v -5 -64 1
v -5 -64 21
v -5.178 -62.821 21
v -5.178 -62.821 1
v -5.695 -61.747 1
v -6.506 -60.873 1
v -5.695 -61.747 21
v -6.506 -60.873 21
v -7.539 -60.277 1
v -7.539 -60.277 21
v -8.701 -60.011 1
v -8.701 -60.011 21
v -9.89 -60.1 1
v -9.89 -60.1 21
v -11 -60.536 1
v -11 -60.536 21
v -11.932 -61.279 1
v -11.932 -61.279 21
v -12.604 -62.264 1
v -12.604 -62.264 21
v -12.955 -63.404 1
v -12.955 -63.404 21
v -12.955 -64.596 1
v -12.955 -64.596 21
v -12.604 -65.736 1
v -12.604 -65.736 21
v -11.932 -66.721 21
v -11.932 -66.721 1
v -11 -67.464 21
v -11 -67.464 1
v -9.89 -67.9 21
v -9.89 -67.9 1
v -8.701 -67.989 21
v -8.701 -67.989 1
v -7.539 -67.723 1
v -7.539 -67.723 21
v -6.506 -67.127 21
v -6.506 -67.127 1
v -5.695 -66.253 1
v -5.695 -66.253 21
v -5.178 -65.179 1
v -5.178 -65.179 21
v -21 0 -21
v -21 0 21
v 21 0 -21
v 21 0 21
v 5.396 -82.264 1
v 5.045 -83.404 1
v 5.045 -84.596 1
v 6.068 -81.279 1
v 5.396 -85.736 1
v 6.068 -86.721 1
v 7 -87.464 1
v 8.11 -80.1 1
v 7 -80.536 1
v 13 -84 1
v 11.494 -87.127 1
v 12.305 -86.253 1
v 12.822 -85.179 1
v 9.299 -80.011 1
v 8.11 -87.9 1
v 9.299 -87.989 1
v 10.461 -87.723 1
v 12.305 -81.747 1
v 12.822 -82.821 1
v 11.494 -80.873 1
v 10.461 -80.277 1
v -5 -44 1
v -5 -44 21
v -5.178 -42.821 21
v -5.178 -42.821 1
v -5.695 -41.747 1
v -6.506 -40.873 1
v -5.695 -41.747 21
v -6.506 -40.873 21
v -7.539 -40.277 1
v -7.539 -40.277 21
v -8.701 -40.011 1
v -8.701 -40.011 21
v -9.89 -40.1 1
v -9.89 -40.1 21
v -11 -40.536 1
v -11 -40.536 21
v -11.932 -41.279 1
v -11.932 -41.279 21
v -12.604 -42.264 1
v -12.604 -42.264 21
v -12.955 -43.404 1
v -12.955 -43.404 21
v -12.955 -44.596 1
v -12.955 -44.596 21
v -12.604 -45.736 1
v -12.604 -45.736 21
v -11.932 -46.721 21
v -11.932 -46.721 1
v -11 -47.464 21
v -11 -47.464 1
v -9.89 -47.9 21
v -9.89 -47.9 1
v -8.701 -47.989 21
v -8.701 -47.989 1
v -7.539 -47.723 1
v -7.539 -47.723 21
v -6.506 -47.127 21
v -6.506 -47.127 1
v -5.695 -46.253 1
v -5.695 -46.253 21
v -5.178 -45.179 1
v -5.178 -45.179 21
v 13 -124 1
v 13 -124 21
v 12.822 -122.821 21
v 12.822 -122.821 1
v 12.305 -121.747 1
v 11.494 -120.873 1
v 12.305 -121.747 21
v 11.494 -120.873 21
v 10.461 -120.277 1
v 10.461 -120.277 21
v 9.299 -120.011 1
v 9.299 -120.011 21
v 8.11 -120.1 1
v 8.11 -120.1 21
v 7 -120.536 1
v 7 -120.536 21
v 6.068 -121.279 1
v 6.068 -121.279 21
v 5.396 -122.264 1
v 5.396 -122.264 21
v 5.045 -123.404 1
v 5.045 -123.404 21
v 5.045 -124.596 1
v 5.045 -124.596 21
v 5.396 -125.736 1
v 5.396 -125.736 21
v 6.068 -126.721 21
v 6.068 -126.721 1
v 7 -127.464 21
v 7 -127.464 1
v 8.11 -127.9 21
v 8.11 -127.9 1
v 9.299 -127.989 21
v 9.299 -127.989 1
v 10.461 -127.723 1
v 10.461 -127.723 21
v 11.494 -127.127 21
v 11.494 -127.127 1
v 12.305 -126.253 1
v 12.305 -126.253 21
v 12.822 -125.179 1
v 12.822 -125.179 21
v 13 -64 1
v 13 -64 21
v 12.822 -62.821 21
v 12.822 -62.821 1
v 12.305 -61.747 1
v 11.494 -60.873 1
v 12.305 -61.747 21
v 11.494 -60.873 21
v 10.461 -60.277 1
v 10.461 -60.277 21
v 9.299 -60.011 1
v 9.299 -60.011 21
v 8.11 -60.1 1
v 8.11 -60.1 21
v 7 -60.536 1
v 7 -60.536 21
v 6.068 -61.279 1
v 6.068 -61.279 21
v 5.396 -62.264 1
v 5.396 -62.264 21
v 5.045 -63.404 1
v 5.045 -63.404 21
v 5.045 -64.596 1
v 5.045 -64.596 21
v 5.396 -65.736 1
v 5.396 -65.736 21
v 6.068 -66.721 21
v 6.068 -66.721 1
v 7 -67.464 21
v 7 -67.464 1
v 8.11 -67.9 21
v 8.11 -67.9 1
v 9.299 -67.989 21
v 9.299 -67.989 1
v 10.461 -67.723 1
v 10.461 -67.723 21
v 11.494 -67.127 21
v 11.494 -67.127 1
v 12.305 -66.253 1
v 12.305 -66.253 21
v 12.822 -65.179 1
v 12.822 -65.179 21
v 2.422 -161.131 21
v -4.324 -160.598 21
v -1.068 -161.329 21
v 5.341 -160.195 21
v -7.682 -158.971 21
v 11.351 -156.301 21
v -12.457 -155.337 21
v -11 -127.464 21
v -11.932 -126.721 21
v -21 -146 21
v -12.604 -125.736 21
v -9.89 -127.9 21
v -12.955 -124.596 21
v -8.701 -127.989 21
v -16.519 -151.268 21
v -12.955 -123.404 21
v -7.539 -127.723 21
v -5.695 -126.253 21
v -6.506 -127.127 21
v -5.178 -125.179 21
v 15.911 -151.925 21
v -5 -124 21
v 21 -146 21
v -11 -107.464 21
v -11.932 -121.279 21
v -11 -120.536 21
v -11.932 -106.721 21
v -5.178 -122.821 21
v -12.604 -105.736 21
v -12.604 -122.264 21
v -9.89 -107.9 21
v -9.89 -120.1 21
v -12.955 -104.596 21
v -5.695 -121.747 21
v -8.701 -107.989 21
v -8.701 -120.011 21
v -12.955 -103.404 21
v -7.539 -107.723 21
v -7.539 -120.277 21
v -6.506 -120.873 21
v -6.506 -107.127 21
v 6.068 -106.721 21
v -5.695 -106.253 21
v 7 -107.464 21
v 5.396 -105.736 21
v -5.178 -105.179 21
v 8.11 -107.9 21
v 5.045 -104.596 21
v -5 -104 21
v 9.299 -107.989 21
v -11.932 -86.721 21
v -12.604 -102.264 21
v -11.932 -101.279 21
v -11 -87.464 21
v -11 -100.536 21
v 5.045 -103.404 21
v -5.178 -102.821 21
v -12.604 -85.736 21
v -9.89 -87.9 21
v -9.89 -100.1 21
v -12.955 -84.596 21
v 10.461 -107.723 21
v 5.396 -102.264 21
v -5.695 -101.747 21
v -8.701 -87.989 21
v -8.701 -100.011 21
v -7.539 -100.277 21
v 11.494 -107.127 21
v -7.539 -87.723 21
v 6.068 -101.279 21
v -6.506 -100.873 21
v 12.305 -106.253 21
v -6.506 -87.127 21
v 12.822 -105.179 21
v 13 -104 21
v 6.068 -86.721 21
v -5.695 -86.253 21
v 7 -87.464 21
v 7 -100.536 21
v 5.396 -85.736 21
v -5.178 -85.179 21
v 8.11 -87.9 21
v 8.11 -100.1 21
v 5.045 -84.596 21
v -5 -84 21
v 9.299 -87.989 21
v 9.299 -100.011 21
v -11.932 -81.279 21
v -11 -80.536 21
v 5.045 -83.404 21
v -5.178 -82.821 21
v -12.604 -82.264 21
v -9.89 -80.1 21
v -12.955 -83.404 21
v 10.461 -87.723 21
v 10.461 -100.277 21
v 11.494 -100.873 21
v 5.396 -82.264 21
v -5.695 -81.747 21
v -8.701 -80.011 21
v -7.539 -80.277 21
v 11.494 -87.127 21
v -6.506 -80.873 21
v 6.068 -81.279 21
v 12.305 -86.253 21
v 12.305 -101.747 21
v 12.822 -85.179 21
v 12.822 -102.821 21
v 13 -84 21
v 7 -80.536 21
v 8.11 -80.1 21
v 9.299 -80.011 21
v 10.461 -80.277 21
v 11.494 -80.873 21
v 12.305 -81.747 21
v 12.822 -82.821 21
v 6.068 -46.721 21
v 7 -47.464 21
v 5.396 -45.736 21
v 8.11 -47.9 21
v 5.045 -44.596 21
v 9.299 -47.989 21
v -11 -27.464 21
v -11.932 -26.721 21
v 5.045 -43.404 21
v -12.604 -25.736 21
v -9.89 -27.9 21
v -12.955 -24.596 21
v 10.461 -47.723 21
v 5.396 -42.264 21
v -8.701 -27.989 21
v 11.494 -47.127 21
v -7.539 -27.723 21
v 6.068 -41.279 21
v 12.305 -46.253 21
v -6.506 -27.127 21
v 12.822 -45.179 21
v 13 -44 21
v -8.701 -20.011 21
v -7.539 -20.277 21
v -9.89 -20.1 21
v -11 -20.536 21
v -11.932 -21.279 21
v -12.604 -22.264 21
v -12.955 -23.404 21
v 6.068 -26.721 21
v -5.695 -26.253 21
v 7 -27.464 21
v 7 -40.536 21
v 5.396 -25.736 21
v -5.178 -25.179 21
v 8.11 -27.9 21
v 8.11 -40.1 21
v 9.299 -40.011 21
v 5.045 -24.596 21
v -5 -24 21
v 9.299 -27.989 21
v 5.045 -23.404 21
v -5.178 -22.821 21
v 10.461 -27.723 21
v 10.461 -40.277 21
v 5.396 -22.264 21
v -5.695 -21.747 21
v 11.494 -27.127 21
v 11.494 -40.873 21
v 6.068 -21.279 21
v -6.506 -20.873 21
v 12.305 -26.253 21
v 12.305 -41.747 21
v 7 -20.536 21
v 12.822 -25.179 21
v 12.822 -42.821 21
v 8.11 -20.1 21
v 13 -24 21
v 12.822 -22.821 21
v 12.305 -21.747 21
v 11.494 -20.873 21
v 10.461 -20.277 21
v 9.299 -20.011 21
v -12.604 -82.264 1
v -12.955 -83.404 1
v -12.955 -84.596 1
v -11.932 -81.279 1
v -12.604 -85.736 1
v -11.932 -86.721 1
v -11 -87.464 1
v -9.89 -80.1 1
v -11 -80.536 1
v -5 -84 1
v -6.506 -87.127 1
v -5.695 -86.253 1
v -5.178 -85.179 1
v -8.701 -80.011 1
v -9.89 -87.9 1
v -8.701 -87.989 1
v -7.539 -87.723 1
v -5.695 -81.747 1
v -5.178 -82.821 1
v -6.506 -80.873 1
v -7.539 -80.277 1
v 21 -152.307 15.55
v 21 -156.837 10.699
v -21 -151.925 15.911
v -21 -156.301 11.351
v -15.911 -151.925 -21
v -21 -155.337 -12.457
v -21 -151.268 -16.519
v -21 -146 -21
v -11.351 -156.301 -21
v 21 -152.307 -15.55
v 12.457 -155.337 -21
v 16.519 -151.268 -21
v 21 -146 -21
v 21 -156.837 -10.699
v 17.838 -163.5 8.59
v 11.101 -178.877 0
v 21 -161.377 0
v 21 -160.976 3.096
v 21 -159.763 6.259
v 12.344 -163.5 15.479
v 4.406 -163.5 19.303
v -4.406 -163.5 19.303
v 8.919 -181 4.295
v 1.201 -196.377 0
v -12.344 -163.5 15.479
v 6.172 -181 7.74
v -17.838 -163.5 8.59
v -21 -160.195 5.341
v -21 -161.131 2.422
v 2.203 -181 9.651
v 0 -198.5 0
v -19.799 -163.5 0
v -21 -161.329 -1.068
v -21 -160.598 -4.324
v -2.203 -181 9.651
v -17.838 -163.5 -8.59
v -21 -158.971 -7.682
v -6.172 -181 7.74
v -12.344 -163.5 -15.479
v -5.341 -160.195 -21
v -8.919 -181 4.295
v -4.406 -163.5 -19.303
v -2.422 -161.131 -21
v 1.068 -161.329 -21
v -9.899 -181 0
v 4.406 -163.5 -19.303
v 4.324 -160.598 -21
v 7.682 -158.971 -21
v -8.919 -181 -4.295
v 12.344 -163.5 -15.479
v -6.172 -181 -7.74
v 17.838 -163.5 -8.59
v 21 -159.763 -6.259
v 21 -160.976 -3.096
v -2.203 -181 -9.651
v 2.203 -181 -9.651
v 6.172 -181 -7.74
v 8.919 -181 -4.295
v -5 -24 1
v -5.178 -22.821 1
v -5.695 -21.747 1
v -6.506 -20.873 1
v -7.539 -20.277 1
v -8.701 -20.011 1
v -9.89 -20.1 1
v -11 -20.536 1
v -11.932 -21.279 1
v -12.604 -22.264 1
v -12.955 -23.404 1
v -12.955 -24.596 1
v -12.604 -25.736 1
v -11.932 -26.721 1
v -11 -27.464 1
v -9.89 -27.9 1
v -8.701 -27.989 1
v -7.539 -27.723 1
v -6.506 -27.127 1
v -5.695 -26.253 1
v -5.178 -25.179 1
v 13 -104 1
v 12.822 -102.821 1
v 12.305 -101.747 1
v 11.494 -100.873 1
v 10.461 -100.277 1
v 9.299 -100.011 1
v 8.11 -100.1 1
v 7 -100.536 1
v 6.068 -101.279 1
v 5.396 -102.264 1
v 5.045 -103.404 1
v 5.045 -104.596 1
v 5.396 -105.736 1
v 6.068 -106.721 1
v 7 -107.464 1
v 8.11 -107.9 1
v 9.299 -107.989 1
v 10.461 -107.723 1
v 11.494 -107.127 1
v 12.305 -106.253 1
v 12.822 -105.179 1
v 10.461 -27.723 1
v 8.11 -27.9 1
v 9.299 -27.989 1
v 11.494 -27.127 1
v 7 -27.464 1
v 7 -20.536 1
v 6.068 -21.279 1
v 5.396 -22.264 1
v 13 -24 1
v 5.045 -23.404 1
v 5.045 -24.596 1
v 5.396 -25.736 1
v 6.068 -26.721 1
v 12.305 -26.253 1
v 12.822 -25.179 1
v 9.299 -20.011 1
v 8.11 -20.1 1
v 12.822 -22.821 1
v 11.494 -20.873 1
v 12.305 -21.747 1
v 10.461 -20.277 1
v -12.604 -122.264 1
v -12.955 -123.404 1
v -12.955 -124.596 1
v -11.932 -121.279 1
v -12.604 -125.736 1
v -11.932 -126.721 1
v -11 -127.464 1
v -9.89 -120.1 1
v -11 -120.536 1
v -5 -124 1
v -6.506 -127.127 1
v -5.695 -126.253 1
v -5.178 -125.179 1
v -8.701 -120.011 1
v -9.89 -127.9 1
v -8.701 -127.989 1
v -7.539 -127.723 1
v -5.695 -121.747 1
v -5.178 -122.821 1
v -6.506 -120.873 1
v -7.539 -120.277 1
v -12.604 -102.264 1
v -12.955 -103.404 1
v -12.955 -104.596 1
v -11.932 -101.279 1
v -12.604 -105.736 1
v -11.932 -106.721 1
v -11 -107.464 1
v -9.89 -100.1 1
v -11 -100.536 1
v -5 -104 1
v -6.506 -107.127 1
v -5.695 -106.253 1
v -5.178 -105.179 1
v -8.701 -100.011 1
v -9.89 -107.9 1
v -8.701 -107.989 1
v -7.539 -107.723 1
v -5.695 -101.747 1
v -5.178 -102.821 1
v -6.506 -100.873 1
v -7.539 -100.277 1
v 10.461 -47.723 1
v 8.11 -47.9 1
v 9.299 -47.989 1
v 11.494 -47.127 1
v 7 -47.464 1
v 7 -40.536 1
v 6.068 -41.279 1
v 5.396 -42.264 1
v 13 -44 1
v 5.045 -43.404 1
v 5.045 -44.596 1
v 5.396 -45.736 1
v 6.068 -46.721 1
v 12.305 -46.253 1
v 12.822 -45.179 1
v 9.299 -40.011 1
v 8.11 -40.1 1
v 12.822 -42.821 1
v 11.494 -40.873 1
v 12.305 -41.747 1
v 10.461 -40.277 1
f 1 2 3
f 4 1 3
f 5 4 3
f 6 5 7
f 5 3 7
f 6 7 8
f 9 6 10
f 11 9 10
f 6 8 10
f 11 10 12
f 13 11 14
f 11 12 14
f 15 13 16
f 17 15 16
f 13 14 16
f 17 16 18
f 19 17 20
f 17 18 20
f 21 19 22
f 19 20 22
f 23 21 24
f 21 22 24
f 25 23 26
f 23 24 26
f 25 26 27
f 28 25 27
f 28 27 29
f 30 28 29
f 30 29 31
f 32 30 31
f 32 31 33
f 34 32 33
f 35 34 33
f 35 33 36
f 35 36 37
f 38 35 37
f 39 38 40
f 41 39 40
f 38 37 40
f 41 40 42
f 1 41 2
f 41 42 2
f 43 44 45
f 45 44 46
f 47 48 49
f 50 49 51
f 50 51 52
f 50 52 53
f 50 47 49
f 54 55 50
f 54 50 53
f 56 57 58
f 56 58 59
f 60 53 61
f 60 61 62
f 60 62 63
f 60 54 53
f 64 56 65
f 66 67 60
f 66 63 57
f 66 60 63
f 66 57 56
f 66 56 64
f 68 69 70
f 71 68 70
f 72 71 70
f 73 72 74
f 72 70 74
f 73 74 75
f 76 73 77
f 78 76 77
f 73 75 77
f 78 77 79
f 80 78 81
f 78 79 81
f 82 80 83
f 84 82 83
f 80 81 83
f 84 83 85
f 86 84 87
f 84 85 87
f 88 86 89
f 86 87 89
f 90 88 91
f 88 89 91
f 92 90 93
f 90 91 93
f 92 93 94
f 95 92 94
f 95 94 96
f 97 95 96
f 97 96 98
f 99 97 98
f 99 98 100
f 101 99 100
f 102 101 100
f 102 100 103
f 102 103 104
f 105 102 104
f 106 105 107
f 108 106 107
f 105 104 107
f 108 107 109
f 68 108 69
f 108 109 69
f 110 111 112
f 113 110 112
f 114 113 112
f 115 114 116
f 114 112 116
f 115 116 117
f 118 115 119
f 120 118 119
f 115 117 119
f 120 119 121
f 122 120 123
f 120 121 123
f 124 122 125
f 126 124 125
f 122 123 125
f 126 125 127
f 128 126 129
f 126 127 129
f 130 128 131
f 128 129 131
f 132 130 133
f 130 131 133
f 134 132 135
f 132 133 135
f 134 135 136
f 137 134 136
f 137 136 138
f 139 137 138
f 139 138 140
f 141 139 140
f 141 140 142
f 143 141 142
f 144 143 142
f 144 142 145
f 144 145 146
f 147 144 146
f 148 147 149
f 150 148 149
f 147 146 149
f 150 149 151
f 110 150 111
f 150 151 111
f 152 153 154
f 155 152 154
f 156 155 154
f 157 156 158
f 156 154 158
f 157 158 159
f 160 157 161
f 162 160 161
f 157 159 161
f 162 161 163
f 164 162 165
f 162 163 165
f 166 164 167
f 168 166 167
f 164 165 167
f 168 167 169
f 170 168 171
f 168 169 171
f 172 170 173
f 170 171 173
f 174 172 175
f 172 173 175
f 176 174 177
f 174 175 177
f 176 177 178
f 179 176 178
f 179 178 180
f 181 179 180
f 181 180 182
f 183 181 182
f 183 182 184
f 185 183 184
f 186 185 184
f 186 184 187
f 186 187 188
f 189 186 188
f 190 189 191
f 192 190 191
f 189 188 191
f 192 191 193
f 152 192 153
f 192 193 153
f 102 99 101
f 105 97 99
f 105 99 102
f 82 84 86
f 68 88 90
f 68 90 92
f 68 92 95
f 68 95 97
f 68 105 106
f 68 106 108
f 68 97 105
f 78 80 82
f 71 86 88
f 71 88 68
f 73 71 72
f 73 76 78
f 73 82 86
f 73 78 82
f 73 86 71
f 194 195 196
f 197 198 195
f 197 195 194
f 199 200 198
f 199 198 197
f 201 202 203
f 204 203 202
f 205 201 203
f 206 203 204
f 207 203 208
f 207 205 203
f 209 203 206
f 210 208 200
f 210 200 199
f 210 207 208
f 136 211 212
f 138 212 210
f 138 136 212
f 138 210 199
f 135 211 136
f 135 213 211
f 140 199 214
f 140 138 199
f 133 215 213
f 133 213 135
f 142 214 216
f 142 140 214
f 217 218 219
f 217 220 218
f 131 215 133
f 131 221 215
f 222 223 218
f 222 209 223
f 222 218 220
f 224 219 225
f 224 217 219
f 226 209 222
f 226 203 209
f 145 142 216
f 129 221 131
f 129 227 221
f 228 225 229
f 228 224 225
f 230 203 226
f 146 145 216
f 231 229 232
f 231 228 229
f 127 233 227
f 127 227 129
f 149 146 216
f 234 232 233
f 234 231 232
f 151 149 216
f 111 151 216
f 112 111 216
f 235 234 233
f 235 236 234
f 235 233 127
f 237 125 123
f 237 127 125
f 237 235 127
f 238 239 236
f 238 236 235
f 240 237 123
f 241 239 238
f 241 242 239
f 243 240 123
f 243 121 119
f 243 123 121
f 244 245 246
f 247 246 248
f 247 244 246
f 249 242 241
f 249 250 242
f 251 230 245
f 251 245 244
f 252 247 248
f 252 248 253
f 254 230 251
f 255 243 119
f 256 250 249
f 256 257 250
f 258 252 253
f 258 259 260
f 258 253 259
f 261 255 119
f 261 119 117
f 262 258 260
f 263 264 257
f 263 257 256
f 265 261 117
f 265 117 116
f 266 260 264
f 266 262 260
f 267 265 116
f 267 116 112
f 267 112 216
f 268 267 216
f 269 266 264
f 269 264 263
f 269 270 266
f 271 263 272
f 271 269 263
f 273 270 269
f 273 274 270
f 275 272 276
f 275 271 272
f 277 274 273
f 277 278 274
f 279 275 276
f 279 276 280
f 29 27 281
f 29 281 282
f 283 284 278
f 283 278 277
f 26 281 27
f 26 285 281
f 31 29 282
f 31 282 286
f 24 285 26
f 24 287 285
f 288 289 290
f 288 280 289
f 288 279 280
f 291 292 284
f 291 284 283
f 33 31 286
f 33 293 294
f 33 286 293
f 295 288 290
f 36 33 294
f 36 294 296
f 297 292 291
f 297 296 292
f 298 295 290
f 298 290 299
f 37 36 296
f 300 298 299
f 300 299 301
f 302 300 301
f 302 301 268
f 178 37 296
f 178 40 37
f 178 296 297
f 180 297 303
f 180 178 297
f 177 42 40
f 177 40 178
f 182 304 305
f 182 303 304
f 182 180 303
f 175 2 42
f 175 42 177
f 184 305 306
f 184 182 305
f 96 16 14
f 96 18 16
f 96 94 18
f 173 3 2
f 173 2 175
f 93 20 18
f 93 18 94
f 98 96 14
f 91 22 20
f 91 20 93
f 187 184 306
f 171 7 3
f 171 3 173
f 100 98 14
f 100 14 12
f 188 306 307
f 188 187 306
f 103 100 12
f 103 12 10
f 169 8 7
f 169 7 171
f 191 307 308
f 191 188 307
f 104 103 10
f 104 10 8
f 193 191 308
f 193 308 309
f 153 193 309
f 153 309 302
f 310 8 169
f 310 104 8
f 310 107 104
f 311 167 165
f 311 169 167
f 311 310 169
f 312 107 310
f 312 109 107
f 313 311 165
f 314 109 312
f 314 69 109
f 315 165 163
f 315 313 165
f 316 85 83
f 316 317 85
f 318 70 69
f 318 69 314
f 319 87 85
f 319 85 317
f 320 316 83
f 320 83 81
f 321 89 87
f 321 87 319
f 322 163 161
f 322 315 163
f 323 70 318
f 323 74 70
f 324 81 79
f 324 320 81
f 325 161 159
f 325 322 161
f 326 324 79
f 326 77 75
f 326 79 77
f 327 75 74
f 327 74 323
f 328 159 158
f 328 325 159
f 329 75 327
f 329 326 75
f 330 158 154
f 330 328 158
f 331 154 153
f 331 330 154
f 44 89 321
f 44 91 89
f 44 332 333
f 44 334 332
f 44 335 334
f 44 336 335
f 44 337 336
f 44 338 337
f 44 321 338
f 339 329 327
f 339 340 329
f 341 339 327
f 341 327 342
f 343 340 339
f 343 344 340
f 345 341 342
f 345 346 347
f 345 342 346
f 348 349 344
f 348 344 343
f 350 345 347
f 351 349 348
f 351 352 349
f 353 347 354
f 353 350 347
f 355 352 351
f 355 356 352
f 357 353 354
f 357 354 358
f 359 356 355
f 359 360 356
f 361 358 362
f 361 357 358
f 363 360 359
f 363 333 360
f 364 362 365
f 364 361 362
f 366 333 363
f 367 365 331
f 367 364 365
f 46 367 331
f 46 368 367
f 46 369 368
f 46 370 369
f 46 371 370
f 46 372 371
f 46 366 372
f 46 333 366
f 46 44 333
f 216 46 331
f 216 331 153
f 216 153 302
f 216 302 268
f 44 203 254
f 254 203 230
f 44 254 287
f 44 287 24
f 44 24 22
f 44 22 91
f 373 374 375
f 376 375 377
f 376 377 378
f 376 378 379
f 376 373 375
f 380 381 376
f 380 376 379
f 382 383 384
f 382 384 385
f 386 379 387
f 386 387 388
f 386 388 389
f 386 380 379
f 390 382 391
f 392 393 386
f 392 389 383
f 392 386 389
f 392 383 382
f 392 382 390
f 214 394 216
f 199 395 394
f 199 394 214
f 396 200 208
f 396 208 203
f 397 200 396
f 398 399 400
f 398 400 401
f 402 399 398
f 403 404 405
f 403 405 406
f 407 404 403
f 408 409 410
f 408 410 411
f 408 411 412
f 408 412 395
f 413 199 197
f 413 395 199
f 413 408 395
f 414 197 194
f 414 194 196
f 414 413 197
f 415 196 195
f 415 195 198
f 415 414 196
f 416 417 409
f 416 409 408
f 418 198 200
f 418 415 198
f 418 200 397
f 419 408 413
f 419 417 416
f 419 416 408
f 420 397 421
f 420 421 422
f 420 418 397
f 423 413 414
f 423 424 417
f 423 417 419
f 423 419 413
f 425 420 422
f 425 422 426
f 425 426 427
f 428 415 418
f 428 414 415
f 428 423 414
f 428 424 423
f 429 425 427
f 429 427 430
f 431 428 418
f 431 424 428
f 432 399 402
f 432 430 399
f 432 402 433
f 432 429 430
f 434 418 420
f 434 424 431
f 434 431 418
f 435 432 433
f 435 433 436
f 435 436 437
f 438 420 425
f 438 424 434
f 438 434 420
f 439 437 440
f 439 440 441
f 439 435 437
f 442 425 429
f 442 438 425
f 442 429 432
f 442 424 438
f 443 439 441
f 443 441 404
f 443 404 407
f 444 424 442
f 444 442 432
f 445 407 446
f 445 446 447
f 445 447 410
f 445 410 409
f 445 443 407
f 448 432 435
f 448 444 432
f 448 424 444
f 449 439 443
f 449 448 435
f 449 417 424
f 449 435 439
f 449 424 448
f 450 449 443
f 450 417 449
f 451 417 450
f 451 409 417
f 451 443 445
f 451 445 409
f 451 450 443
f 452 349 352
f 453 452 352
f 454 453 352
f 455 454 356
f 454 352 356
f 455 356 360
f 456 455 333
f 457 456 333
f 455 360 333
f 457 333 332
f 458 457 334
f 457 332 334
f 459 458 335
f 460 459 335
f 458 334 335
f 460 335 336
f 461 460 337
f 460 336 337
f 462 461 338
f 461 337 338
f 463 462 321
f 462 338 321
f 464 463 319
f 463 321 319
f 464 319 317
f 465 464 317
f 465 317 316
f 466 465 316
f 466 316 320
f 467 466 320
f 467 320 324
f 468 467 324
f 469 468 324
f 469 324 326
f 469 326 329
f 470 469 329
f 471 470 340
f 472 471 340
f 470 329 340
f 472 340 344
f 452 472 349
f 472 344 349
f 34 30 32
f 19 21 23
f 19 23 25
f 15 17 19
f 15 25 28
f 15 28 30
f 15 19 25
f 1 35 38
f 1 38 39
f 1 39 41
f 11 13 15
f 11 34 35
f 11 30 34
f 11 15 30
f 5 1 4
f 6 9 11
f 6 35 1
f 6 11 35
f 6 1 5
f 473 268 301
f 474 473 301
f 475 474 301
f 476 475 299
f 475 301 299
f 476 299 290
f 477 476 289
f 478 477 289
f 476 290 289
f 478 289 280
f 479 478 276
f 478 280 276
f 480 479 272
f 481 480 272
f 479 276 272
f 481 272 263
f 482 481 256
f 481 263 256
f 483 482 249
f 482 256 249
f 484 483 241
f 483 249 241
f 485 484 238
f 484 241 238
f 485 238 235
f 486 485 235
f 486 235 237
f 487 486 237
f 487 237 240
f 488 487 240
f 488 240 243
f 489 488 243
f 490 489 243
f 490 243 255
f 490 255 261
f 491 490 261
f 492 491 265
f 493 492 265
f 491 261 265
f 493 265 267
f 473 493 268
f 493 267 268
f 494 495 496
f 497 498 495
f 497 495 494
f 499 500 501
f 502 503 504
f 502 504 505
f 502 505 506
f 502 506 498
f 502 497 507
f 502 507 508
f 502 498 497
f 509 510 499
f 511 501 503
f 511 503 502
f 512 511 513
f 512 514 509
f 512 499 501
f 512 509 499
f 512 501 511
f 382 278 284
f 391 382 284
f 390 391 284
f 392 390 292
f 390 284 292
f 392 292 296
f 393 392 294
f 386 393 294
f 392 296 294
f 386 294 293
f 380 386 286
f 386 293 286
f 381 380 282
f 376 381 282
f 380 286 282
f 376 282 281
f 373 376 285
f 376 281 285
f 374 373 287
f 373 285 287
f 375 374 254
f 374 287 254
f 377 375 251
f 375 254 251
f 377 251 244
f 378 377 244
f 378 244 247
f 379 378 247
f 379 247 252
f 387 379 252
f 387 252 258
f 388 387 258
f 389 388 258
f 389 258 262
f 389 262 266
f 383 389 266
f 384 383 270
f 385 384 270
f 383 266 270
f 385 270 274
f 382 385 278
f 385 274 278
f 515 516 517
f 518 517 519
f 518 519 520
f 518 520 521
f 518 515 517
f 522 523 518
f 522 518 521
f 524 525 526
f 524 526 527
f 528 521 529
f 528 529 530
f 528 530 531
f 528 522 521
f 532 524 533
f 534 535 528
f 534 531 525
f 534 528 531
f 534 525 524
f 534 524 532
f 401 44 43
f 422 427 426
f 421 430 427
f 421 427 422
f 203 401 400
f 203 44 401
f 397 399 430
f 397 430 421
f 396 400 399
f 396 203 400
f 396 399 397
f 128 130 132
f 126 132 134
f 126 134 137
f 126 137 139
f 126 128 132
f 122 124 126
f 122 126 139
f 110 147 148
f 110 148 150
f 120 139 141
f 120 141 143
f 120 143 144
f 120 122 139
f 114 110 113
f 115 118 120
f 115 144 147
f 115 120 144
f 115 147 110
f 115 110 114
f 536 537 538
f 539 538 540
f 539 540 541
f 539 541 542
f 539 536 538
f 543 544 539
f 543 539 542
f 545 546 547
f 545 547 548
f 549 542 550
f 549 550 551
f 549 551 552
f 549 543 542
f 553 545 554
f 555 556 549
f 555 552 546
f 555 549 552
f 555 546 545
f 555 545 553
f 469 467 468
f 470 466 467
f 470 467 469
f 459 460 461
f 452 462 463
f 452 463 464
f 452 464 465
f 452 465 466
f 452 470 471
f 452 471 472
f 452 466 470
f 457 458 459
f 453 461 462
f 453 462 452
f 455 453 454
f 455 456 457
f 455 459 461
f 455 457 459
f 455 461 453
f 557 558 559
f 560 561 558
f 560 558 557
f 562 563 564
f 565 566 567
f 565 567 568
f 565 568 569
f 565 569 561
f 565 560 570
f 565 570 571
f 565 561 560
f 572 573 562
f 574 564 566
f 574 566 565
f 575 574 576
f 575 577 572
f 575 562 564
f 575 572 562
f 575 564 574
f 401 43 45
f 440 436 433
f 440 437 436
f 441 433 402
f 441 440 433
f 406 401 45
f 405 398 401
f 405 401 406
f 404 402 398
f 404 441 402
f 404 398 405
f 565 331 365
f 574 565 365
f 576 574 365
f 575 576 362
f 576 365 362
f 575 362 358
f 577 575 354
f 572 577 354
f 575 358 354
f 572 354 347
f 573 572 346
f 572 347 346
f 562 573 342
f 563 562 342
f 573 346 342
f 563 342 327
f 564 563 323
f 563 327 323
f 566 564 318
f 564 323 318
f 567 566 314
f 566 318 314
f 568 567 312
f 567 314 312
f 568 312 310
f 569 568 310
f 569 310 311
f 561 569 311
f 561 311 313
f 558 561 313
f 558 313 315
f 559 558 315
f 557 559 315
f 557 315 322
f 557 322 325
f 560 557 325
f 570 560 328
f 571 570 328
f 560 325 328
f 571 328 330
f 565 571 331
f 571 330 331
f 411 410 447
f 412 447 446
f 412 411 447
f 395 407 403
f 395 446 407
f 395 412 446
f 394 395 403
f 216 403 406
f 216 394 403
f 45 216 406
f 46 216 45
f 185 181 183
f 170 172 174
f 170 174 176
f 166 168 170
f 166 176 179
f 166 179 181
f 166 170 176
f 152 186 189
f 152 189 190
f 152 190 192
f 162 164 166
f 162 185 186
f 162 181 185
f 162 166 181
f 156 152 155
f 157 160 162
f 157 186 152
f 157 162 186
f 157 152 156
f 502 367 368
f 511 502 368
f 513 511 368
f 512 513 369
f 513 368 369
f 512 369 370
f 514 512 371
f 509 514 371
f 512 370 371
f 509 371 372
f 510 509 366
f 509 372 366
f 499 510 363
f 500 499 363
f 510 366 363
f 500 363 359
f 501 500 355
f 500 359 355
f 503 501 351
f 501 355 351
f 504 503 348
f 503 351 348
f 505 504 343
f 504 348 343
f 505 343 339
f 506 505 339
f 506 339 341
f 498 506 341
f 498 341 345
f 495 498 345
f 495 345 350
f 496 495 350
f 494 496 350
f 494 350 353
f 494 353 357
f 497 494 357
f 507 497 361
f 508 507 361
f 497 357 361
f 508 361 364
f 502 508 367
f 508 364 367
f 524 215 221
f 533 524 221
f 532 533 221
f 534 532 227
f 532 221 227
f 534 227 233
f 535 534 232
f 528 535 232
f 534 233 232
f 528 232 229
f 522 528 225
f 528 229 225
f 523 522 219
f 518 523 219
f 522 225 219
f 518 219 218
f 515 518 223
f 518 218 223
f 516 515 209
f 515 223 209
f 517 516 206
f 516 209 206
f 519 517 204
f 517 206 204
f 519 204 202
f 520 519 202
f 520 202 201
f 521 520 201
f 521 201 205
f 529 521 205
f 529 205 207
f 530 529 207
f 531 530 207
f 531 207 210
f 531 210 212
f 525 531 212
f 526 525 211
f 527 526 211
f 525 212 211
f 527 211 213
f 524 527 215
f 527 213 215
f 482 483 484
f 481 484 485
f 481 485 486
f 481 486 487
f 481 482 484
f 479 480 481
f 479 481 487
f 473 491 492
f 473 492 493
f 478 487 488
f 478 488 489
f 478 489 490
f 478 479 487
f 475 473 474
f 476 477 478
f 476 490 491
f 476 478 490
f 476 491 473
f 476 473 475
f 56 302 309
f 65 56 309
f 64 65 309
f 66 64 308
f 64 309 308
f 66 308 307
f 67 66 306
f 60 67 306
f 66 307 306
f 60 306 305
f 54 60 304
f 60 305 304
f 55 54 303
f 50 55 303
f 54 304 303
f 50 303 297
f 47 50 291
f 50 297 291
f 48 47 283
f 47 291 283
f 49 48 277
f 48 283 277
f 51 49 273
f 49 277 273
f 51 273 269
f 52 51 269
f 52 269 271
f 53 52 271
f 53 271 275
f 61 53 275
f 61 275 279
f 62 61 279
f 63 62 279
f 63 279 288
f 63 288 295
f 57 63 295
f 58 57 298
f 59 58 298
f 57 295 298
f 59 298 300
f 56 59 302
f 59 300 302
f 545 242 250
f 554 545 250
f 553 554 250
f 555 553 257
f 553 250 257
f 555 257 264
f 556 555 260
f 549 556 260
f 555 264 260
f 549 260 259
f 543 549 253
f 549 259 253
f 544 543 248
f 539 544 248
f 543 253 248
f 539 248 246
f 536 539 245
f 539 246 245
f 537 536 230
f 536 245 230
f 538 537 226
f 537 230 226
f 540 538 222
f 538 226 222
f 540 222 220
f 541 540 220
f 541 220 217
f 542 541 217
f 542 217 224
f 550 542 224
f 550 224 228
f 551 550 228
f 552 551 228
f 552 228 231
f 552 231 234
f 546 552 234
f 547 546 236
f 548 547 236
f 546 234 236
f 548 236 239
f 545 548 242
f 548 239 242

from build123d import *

# Parameters (mm, degrees)
F0_W      = 42
F0_H      = 42
F1_DEPTH  = 146
F2_R      = 29.6984848098
F4_R      = 21
F5_DEPTH  = 25
F6_R      = 21
F9_DEPTH  = 25
F7_R      = 21
F10_DEPTH = 25
F8_R      = 21
F11_DEPTH = 25
F12_R     = 4
F13_DEPTH = 20


# Not quite as in the source:
# - an extrude whose draft closes it to a point is written as a loft to that point


with BuildPart() as f1:
    # F0 (on Front) → F1 (new body)
    with BuildSketch(Plane.XZ):
        Rectangle(F0_W, F0_H)
    extrude(amount=F1_DEPTH)

    # F2 (on face) → F3 section 0
    with BuildSketch(Plane.XZ.offset(146), mode=Mode.PRIVATE) as f3_s0:
        Circle(F2_R)
    loft([f3_s0.sketch, Vertex(0, -198.4999999927, 0)], ruled=True)

    # F4 (on face) → F5 (cut)
    with BuildSketch(Plane(origin=(-21, 0, 0), x_dir=(0, -1, 0), z_dir=(-1, 0, 0))):
        with Locations((146, 0)):
            Circle(F4_R)
    extrude(amount=F5_DEPTH, mode=Mode.SUBTRACT)

    # F6 (on face) → F9 (cut)
    with BuildSketch(Plane.XY.offset(21)):
        with Locations((0, -146)):
            Circle(F6_R)
    extrude(amount=F9_DEPTH, mode=Mode.SUBTRACT)

    # F7 (on face) → F10 (cut)
    with BuildSketch(Plane.YZ.offset(21)):
        with Locations((-146, 0)):
            Circle(F7_R)
    extrude(amount=F10_DEPTH, mode=Mode.SUBTRACT)

    # F8 (on face) → F11 (cut)
    with BuildSketch(Plane(origin=(0, 0, -21), x_dir=(1, 0, 0), z_dir=(0, 0, -1))):
        with Locations((0, 146)):
            Circle(F8_R)
    extrude(amount=F11_DEPTH, mode=Mode.SUBTRACT)

    # F12 (on face) → F13 (cut)
    with BuildSketch(Plane.XY.offset(21)):
        with Locations((-9, -24)):
            Circle(F12_R)
        with Locations((-9, -44)):
            Circle(F12_R)
        with Locations((-9, -64)):
            Circle(F12_R)
        with Locations((-9, -84)):
            Circle(F12_R)
        with Locations((-9, -104)):
            Circle(F12_R)
        with Locations((-9, -124)):
            Circle(F12_R)
        with Locations((9, -24)):
            Circle(F12_R)
        with Locations((9, -44)):
            Circle(F12_R)
        with Locations((9, -64)):
            Circle(F12_R)
        with Locations((9, -84)):
            Circle(F12_R)
        with Locations((9, -104)):
            Circle(F12_R)
        with Locations((9, -124)):
            Circle(F12_R)
    extrude(amount=-F13_DEPTH, mode=Mode.SUBTRACT)


solid = f1.part
